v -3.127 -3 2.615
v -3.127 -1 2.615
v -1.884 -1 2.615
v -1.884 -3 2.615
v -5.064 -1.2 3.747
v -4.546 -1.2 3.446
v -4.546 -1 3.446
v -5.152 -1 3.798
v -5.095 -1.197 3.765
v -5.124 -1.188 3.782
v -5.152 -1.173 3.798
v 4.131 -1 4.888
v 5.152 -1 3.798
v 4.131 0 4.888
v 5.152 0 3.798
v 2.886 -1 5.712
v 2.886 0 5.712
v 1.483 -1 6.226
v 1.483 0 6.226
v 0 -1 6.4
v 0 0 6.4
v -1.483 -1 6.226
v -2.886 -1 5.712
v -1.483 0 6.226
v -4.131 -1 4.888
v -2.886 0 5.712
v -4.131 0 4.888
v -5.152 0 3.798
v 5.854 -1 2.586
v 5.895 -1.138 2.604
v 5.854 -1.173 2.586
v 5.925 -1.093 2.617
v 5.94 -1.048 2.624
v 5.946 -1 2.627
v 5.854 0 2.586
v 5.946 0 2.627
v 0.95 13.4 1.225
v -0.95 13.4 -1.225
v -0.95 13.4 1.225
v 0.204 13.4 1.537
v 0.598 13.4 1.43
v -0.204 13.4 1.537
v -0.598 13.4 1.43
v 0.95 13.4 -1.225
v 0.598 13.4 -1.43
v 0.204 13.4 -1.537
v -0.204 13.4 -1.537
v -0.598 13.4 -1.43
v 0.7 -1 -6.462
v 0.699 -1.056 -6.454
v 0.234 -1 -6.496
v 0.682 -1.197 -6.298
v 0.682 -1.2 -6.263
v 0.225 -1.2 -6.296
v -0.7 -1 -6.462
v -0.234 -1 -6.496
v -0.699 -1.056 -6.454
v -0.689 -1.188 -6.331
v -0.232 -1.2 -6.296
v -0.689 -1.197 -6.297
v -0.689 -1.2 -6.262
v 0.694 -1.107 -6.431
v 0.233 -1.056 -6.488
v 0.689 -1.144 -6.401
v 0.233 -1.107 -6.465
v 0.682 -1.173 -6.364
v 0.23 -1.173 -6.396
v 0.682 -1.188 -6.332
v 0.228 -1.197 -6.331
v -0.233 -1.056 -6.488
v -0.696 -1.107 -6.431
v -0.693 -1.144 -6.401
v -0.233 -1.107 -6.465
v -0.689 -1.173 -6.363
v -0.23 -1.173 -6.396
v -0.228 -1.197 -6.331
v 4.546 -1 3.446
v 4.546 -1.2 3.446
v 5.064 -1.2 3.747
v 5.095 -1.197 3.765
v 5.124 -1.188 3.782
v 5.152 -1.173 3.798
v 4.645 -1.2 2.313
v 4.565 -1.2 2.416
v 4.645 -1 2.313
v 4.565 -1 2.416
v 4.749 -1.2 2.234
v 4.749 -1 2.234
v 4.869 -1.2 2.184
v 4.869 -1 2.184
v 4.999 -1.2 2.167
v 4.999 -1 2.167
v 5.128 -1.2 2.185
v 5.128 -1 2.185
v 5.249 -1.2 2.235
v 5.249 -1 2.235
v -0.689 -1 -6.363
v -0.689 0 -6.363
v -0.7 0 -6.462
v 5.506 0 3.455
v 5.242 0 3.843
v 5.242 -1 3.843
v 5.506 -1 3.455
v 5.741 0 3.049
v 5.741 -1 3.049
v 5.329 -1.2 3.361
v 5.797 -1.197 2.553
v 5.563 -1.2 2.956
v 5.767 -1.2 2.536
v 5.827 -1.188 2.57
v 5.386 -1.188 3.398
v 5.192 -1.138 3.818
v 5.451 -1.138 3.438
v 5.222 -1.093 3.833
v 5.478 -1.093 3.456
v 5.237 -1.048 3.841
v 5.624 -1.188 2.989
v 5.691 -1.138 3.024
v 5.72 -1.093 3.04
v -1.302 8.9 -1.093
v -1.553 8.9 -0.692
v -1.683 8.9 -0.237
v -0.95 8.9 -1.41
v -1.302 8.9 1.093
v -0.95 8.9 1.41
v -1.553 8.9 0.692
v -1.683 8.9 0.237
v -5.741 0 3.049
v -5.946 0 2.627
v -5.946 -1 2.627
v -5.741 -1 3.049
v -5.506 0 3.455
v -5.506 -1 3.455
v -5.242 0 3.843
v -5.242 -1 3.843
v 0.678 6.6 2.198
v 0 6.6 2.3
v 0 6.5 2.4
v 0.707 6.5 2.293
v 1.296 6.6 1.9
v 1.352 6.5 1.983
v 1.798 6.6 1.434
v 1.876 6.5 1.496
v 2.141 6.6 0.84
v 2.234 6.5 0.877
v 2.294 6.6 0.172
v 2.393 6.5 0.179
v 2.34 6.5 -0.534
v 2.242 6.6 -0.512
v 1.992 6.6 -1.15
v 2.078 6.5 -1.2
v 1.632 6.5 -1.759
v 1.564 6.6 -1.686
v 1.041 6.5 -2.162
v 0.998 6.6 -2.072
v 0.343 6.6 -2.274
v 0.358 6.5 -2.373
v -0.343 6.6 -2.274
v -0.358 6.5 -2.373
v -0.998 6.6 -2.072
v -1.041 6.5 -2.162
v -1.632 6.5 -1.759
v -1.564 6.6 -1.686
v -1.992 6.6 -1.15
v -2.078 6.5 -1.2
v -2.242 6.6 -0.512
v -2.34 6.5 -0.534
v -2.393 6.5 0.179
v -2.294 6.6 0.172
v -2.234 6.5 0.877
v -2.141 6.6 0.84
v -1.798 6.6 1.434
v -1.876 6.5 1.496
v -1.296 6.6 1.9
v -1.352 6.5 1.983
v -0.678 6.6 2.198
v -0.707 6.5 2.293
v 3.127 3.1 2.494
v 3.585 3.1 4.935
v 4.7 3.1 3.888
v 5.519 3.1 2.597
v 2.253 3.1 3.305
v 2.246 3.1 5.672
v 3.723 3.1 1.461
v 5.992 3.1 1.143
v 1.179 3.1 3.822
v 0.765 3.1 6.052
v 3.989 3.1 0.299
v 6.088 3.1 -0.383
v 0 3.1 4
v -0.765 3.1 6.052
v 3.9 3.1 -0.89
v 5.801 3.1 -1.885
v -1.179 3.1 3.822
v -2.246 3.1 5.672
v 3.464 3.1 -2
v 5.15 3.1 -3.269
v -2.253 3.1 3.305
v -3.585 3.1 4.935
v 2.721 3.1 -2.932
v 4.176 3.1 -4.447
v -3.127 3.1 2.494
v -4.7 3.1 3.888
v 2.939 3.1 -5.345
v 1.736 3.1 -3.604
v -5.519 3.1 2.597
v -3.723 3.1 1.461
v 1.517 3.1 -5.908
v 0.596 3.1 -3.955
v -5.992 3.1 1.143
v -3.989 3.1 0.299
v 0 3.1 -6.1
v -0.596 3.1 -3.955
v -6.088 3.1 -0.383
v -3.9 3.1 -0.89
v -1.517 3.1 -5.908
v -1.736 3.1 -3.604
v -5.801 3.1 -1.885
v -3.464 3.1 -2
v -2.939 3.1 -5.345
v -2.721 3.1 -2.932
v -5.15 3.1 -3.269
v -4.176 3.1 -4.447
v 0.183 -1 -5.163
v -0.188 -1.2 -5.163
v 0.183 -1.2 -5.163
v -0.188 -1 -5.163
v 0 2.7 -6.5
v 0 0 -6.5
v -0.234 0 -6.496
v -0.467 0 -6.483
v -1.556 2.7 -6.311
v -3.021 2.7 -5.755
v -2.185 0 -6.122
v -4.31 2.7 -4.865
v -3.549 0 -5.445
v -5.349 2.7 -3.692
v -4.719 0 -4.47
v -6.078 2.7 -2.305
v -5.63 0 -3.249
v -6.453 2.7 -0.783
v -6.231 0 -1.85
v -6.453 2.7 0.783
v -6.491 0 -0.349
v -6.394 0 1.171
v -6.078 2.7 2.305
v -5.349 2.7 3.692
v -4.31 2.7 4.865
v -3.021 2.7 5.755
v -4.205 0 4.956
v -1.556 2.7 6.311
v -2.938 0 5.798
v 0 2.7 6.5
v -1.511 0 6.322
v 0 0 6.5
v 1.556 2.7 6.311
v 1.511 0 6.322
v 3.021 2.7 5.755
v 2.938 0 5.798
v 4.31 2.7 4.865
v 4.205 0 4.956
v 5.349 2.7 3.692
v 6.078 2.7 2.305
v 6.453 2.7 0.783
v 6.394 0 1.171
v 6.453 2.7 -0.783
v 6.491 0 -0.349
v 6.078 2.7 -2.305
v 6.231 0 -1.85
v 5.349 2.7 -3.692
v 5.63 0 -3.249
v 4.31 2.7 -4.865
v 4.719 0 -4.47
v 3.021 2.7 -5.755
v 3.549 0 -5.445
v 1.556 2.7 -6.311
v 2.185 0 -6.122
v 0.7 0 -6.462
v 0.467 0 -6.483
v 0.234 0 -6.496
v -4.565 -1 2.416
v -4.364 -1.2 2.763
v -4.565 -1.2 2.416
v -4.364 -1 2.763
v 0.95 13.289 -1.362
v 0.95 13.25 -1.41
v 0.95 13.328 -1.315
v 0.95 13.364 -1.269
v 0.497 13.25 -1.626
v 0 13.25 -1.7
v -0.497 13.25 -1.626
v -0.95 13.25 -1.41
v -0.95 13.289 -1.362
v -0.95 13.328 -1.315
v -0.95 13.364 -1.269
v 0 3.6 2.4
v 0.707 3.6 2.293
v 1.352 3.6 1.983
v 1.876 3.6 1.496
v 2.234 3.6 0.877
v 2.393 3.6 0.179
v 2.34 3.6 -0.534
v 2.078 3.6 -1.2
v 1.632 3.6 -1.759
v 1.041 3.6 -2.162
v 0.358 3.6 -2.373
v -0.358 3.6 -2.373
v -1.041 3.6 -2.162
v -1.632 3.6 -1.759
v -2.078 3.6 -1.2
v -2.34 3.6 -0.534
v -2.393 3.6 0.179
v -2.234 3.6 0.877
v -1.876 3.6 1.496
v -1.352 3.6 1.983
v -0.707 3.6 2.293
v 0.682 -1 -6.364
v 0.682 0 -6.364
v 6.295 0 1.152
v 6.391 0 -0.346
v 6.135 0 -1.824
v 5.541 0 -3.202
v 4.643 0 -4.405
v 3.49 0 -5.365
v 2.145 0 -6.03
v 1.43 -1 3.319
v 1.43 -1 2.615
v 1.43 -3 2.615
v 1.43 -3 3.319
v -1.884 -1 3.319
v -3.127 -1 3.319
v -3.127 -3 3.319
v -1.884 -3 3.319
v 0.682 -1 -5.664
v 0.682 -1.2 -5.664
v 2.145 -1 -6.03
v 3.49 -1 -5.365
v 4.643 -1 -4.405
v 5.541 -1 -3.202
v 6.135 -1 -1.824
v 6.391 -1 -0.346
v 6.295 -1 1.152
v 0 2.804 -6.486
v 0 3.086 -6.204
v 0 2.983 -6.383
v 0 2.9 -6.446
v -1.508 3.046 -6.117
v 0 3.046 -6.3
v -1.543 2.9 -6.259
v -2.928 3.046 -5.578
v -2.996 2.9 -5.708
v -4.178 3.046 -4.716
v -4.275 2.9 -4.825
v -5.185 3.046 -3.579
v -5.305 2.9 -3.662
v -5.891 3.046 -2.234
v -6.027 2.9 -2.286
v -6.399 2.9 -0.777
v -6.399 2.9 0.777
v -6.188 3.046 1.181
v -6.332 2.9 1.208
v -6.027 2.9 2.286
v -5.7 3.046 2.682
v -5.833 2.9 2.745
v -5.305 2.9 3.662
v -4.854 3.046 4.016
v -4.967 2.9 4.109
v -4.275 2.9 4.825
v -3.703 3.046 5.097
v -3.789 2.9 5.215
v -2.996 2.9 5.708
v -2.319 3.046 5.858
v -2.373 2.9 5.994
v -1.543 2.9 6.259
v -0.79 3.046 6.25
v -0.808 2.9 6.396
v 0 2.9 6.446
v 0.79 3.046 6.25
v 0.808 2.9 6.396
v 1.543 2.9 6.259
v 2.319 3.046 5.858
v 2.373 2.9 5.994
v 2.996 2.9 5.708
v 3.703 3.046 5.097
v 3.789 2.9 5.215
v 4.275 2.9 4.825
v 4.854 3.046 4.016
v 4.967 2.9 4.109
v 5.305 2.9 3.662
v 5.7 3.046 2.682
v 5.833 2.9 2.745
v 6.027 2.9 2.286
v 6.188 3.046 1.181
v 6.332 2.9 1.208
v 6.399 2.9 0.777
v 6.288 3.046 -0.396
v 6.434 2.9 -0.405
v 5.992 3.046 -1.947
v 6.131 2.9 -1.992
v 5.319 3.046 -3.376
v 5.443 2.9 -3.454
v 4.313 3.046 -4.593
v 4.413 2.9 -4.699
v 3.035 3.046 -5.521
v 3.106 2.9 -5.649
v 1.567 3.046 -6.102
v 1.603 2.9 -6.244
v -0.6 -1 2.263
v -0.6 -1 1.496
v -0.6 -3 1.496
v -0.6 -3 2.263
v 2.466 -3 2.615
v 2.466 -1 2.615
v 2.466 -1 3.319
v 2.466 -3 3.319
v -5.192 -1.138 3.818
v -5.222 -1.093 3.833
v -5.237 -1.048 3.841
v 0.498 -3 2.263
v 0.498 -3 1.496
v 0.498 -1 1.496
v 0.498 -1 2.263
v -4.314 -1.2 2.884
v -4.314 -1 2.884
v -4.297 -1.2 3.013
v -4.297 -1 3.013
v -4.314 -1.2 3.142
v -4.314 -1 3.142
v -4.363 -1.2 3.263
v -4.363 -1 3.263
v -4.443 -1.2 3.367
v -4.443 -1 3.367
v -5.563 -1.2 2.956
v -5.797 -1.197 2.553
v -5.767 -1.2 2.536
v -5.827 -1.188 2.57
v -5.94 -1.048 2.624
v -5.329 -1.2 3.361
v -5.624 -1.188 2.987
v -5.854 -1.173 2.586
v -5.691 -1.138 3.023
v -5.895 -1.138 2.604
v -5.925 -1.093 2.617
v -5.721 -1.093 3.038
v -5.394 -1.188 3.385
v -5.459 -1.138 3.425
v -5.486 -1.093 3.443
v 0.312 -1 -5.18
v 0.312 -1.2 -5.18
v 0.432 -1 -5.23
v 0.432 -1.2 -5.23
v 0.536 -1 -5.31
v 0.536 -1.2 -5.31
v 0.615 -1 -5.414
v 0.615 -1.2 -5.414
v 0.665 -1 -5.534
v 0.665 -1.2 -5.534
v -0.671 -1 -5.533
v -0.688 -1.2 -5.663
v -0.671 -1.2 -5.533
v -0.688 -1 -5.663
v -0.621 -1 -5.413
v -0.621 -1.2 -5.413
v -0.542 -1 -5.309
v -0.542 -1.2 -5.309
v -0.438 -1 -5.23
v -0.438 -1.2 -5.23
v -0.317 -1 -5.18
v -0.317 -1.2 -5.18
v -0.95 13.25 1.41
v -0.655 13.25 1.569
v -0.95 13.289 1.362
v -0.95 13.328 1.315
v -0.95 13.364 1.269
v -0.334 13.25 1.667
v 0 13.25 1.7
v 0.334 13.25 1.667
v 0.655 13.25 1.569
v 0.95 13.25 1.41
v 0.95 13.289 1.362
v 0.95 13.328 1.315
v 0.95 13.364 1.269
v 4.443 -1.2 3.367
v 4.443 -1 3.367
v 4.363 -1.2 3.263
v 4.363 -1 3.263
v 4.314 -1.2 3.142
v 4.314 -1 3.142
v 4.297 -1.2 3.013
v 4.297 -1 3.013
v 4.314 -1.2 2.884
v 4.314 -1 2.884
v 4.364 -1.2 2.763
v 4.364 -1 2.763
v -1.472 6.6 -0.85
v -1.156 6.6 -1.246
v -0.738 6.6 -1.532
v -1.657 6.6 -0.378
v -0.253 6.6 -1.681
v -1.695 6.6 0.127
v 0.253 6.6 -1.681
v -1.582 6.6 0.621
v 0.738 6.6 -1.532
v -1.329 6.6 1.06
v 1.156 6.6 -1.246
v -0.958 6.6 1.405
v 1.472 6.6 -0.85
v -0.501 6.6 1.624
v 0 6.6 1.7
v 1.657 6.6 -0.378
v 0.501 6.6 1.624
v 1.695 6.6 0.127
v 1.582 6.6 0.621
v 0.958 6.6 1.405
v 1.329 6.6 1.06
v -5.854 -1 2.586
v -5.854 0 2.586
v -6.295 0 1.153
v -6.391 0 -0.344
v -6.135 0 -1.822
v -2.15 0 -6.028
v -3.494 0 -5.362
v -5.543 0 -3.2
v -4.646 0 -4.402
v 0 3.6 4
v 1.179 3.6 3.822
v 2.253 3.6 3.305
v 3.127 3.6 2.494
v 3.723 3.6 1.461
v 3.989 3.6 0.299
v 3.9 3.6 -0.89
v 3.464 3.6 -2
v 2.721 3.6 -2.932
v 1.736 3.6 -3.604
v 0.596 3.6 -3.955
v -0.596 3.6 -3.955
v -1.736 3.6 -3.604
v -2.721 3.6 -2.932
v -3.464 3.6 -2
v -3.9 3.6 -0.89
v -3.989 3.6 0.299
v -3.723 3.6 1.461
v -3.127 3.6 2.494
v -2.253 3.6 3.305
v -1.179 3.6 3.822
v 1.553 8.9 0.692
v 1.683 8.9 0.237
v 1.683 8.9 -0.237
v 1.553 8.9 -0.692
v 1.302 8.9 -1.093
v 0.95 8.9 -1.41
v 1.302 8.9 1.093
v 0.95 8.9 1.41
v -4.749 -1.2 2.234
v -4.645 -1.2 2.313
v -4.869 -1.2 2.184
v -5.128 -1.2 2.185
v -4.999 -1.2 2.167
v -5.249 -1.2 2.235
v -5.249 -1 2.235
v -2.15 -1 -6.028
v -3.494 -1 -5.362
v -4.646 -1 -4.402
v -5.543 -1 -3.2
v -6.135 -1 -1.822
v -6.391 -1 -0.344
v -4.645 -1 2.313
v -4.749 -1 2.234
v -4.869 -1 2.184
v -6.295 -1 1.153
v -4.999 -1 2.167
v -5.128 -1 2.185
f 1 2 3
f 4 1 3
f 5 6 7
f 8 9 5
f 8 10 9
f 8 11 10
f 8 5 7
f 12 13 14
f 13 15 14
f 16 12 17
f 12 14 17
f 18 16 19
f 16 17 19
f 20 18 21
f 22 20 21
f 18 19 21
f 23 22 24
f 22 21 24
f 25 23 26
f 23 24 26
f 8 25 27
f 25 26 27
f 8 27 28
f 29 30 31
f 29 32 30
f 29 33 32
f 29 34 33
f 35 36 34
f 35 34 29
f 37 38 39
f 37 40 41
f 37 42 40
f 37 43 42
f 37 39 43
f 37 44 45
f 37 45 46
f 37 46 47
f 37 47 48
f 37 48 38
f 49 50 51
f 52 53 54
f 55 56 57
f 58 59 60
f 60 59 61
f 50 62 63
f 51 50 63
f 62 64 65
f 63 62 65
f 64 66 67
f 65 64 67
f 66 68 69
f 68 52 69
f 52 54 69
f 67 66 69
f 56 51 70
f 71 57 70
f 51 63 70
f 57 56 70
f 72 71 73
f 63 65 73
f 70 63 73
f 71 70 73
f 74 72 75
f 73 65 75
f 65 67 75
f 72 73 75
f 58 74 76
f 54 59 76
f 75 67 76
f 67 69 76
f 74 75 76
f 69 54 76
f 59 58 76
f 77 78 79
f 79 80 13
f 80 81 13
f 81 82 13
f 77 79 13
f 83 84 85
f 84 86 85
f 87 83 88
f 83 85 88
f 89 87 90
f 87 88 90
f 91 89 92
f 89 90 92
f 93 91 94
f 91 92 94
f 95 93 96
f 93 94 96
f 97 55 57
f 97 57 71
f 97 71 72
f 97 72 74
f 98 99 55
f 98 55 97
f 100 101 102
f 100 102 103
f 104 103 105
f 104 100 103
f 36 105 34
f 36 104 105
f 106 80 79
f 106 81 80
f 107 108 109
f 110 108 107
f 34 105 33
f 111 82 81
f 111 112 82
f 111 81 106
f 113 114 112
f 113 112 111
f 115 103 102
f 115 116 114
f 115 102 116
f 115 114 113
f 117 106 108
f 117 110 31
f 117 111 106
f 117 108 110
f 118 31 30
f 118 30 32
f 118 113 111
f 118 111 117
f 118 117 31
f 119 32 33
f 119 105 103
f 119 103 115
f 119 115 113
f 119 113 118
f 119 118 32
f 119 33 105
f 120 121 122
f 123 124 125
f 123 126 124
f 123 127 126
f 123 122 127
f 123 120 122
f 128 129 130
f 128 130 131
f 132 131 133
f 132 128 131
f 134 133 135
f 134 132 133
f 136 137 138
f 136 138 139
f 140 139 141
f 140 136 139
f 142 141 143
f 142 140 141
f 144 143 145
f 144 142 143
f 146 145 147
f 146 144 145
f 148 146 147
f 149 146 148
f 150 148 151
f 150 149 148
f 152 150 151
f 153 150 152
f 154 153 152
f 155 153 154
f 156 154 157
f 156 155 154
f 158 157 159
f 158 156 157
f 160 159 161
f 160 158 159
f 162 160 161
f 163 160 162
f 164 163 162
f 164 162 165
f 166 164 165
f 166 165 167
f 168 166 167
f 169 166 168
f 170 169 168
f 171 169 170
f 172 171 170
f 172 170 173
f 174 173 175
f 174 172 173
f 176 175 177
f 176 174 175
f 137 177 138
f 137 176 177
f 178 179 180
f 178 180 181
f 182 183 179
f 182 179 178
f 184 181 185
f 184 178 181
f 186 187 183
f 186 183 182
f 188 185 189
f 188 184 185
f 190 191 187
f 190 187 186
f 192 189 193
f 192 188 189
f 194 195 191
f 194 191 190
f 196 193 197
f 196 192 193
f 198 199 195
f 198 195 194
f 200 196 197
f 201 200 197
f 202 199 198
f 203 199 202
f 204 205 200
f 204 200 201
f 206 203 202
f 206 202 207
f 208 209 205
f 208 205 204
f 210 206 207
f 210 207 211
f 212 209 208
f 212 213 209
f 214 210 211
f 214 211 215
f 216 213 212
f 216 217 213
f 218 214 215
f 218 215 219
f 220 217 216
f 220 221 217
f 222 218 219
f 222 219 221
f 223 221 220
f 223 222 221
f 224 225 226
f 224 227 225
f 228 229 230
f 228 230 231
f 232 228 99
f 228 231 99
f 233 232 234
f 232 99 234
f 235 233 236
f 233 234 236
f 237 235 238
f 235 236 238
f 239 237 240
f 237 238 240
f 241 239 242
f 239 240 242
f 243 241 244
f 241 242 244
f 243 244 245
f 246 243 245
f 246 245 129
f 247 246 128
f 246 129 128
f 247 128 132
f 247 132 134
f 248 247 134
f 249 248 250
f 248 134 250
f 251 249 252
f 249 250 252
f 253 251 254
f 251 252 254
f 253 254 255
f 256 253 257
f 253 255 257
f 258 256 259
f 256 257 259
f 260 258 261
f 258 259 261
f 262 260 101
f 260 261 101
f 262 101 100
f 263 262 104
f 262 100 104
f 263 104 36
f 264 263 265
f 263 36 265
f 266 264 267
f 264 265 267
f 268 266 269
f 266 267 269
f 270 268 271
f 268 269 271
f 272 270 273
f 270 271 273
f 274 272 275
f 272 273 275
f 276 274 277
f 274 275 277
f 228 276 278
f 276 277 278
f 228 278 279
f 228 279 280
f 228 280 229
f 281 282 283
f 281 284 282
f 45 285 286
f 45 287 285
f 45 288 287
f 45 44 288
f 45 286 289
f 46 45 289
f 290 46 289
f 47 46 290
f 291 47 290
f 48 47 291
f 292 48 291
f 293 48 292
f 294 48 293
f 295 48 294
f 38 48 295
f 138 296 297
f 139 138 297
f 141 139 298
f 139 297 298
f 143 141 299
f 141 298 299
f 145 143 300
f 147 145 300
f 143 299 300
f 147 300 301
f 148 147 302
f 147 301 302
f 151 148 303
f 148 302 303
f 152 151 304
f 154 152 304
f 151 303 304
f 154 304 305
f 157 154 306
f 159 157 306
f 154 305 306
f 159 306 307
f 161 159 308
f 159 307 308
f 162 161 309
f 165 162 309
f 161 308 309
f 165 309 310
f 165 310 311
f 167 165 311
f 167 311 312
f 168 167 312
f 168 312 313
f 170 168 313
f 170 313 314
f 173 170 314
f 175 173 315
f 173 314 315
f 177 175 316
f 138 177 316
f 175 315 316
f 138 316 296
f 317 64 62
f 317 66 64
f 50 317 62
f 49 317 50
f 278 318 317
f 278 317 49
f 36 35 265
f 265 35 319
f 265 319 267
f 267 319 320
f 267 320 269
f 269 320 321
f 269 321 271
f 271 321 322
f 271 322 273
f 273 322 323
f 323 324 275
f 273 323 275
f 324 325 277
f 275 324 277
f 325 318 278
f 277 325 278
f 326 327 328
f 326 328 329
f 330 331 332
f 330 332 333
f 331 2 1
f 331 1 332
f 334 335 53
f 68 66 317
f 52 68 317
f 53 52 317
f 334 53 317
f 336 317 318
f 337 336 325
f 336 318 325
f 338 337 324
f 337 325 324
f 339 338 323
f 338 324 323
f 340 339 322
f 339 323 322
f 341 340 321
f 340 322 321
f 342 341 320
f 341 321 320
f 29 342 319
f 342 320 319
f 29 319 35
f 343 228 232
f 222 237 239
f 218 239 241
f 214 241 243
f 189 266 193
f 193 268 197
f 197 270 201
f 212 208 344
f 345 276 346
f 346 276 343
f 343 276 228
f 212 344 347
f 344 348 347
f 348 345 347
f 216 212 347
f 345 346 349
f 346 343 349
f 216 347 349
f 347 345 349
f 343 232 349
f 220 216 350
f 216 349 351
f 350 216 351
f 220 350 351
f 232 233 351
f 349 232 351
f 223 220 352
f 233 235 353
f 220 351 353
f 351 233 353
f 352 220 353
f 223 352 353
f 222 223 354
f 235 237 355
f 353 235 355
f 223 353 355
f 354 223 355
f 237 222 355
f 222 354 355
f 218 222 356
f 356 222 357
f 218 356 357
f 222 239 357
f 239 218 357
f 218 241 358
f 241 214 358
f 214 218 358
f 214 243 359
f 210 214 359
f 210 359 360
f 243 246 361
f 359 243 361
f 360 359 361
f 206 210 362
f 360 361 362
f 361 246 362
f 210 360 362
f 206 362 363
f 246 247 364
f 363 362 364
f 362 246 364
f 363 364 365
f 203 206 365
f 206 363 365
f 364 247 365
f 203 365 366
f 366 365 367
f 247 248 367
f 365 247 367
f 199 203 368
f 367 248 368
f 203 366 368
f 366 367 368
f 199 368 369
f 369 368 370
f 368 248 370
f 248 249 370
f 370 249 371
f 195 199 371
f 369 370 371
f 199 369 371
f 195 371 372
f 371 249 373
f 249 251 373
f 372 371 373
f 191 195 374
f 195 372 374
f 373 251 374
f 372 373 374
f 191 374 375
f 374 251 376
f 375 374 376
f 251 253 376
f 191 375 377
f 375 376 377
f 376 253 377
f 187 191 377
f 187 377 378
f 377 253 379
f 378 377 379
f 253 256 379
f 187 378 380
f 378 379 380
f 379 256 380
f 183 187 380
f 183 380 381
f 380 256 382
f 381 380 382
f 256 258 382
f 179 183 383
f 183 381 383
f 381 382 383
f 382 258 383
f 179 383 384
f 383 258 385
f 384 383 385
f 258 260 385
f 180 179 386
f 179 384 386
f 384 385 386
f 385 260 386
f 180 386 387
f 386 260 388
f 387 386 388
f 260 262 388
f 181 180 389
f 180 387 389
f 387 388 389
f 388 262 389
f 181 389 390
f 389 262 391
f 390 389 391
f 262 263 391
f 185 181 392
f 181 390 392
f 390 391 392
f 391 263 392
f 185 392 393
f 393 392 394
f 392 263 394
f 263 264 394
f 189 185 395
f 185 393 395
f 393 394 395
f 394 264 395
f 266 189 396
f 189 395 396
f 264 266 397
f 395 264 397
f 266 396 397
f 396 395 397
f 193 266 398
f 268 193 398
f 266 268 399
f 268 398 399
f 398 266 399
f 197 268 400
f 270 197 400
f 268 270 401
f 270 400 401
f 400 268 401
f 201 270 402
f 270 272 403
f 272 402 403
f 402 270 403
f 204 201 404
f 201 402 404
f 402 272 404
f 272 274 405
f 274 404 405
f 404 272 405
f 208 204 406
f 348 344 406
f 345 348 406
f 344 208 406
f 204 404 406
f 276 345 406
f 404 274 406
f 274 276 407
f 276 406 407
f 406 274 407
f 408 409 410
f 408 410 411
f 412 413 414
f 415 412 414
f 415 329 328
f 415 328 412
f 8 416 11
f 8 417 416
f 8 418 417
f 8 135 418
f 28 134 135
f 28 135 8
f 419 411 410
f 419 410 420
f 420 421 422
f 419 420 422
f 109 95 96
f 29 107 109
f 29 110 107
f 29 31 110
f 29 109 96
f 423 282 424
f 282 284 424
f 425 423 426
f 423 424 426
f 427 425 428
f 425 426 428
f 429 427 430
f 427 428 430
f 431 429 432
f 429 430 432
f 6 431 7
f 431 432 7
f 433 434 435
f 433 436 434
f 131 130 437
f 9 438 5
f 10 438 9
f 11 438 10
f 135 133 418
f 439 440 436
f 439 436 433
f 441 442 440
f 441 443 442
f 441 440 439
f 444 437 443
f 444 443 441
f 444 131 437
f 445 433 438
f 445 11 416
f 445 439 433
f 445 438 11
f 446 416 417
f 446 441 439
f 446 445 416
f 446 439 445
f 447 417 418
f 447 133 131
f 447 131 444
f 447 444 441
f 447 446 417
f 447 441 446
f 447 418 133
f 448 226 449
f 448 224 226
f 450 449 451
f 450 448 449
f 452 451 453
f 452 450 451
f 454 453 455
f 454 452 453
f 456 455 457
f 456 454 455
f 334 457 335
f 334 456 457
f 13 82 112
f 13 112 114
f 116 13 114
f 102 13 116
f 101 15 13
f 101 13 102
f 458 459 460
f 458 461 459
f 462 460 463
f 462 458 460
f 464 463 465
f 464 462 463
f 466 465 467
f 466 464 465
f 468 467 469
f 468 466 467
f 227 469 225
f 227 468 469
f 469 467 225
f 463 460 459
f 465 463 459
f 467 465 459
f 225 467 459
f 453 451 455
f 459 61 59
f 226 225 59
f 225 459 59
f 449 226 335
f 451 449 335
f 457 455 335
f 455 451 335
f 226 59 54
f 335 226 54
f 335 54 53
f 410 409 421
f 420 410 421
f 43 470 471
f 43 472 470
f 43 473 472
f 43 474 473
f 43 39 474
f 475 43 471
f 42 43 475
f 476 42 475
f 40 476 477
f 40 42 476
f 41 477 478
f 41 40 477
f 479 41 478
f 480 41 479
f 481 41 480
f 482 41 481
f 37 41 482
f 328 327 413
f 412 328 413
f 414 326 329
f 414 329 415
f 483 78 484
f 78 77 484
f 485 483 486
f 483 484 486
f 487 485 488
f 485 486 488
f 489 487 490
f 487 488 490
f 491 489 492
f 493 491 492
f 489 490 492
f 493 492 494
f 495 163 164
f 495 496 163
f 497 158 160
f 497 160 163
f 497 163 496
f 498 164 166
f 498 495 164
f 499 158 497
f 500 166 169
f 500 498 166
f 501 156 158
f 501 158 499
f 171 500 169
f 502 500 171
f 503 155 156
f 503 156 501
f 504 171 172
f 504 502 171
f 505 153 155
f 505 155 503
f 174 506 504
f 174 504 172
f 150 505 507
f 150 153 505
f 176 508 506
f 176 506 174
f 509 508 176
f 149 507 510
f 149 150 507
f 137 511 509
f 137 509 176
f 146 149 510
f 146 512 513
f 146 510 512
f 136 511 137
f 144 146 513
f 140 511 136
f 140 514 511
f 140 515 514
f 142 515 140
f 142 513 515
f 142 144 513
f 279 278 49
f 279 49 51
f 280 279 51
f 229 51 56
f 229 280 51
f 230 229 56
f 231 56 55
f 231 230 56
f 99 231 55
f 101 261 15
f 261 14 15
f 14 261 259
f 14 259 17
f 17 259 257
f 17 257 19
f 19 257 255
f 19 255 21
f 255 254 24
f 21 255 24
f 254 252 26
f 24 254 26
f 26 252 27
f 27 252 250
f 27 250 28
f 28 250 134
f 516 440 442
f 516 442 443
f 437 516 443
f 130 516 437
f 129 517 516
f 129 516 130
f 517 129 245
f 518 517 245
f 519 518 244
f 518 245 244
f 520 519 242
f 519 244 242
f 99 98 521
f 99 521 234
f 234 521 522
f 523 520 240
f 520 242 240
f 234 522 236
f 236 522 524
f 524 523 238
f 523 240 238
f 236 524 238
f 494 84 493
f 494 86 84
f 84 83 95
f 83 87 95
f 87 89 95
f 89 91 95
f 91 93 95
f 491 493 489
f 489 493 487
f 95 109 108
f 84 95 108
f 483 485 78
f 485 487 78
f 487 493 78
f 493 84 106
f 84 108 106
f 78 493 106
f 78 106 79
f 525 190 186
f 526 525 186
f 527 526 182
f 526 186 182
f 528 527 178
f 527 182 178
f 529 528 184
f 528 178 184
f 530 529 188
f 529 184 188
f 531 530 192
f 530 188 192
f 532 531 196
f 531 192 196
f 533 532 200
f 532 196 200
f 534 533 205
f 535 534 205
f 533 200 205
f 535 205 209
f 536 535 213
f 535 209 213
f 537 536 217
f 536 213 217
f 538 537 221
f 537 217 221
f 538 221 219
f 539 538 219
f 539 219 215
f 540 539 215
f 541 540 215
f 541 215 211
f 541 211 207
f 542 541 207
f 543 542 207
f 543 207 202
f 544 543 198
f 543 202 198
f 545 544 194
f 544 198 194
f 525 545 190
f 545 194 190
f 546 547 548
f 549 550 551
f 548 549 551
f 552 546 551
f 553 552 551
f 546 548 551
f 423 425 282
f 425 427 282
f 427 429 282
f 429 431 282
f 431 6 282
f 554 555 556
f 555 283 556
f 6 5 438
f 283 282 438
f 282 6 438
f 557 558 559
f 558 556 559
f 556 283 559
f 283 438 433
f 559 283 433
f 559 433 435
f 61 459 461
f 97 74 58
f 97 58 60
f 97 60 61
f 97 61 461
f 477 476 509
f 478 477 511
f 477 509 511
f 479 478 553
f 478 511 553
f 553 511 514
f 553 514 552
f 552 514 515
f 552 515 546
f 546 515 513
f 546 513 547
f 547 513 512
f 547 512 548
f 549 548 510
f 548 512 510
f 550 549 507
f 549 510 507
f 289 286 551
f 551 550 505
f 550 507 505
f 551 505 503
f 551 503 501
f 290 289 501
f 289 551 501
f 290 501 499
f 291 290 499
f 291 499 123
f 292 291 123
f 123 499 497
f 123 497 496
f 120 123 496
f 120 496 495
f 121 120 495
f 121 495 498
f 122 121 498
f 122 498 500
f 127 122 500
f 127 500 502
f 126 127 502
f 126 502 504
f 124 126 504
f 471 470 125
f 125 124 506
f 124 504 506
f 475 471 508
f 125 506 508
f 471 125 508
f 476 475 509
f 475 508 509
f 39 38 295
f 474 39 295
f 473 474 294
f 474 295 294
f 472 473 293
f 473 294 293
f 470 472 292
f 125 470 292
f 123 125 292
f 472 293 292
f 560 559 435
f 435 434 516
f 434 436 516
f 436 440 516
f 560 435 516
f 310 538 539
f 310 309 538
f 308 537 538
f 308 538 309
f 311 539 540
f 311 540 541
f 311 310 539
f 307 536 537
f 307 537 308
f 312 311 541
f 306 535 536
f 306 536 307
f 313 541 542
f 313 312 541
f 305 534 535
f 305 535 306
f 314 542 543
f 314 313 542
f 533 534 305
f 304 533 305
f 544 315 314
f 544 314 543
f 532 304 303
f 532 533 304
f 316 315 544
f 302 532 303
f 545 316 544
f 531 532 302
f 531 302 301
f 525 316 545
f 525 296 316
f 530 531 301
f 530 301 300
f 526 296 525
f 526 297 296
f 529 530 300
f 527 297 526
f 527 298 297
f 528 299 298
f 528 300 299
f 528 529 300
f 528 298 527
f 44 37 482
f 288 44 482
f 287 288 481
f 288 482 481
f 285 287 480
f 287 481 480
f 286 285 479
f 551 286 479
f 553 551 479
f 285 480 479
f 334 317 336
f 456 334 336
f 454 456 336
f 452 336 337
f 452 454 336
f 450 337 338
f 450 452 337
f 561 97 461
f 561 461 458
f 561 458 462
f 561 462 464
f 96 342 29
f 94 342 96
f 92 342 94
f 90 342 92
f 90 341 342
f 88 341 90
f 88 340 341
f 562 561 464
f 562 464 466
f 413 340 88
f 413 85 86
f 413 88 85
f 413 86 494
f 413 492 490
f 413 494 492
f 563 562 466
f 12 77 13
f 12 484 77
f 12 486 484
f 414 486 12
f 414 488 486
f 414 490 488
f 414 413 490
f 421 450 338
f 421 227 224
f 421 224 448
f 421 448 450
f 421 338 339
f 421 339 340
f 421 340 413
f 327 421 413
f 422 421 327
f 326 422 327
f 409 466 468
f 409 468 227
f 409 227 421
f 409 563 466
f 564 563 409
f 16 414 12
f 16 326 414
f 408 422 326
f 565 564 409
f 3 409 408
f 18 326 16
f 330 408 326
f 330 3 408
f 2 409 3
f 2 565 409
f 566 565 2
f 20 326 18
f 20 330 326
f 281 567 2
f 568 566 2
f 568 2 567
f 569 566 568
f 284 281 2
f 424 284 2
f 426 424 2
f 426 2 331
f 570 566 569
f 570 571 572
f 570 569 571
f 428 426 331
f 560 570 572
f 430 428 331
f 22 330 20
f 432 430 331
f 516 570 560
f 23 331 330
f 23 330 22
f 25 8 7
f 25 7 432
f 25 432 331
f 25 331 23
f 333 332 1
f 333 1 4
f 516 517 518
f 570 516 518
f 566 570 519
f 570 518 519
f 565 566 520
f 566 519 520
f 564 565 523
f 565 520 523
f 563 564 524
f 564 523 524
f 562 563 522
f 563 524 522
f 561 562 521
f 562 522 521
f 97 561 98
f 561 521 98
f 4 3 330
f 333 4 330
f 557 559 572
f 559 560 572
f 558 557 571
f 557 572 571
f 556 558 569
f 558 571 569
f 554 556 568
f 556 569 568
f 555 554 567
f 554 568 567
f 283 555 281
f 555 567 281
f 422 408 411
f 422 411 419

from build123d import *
from build123d.topology import SkipClean

# Parameters (mm, degrees)
SKETCH1_R            = 6.5
BOSS_EXTRUDE1_DEPTH  = 3.1
SKETCH2_R            = 4
BOSS_EXTRUDE2_DEPTH  = 0.5
SKETCH3_R            = 2.4
BOSS_EXTRUDE3_DEPTH  = 3
SKETCH4_R            = 1.7
BOSS_EXTRUDE4_DEPTH  = 6.8
CHAMFER1_SIZE        = 0.15
CUT_EXTRUDE1_DEPTH   = 4.5
SKETCH6_R            = 6.4
BOSS_EXTRUDE5_DEPTH  = 1
FILLET1_R            = 0.4
CHAMFER2_SIZE        = 0.1
BOSS_EXTRUDE6_DEPTH  = 1.2
SKETCH8_W            = 1.400599112
SKETCH8_H            = 0.2
BOSS_EXTRUDE7_DEPTH  = 1.2
SKETCH9_W            = 1.400599112
SKETCH9_H            = 0.2
BOSS_EXTRUDE8_DEPTH  = 1.2
SKETCH10_W           = 1.370501576
SKETCH10_H           = 0.2
BOSS_EXTRUDE9_DEPTH  = 1.2
FILLET2_R            = 0.5
FILLET3_R            = 0.2
SKETCH11_W           = 1.09784978
SKETCH11_H           = 0.766423431
SKETCH11_W_2         = 1.035707339
SKETCH11_H_2         = 0.70428099
SKETCH11_W_3         = 1.242848807
BOSS_EXTRUDE10_DEPTH = 2


with BuildPart() as part:
    # Sketch1 → Boss-Extrude1 (new body)
    with BuildSketch(Plane(origin=(0, 0, 0), x_dir=(1, 0, 0), z_dir=(0, 1, 0))):
        with Locations(Location((0, 0, 0), (0, 0, 90))):
            Circle(SKETCH1_R)
    extrude(amount=BOSS_EXTRUDE1_DEPTH)

    # Sketch2 → Boss-Extrude2 (add)
    with BuildSketch(Plane(origin=(0, 3.1, 0), x_dir=(1, 0, 0), z_dir=(0, 1, 0))):
        with Locations(Location((0, 0, 0), (0, 0, 270))):
            Circle(SKETCH2_R)
    extrude(amount=BOSS_EXTRUDE2_DEPTH)

    # Sketch3 → Boss-Extrude3 (add)
    with BuildSketch(Plane(origin=(0, 3.6, 0), x_dir=(-1, 0, 0), z_dir=(0, 1, 0))):
        with Locations(Location((0, 0, 0), (0, 0, 90))):
            Circle(SKETCH3_R)
    extrude(amount=BOSS_EXTRUDE3_DEPTH)

    # Sketch4 → Boss-Extrude4 (add)
    with BuildSketch(Plane(origin=(0, 6.6, 0), x_dir=(1, 0, 0), z_dir=(0, 1, 0))):
        with Locations(Location((0, 0, 0), (0, 0, 270))):
            Circle(SKETCH4_R)
    extrude(amount=BOSS_EXTRUDE4_DEPTH)

    # Chamfer1
    chamfer1_edges = [part.edges().sort_by_distance(p)[0] for p in [
        (0, 13.4, -1.7),
    ]]
    chamfer(chamfer1_edges, length=CHAMFER1_SIZE)

    # Sketch5 → Cut-Extrude1 (cut)
    with BuildSketch(Plane(origin=(0, 13.4, 0), x_dir=(1, 0, 0), z_dir=(0, 1, 0))):
        Polygon((0.95, 0), (0.95, 1.953547683), (2.291589772, 1.953547683), (2.291589772, -1.88704126), (0.95, -1.88704126), align=None)
        Polygon((-0.95, 0), (-0.95, 2.055691006), (-2.284431096, 2.055691006), (-2.21293077, -1.815540934), (-0.95, -1.815540934), align=None)
    extrude(amount=-CUT_EXTRUDE1_DEPTH, mode=Mode.SUBTRACT)

    # Sketch6 → Boss-Extrude5 (add)
    with BuildSketch(Plane.XZ):
        with Locations(Location((0, 0, 0), (0, 0, 90))):
            Circle(SKETCH6_R)
    extrude(amount=BOSS_EXTRUDE5_DEPTH)

    # Fillet1
    fillet1_edges = [part.edges().sort_by_distance(p)[0] for p in [
        (0, 3.1, 6.5),
    ]]
    fillet(fillet1_edges, radius=FILLET1_R)

    # Chamfer2
    chamfer2_edges = [part.edges().sort_by_distance(p)[0] for p in [
        (0, 6.6, -2.4),
    ]]
    chamfer(chamfer2_edges, length=CHAMFER2_SIZE)

    # Sketch7 → Boss-Extrude6 (add)
    with SkipClean():  # the faces are left unmerged after this step: merging them gives an invalid solid
        with BuildSketch(Plane.XZ):
            with BuildLine():
                Line((5.151524141, 3.79760438), (5.242126256, 3.843190382))
                ThreePointArc((5.242126256, 3.843190382), (5.626855667, 3.253996819), (5.945638893, 2.626666738))
                Line((5.945638893, 2.626666738), (5.854255539, 2.586057247))
                Line((5.854255539, 2.586057247), (5.151524141, 3.79760438))
            make_face()
            with BuildLine():
                Line((-5.242126256, 3.843190382), (-5.151524141, 3.79760438))
                Line((-5.151524141, 3.79760438), (-5.854255539, 2.586057247))
                Line((-5.854255539, 2.586057247), (-5.945638893, 2.626666738))
                ThreePointArc((-5.945638893, 2.626666738), (-5.626855667, 3.253996819), (-5.242126256, 3.843190382))
            make_face()
            with BuildLine():
                Line((-0.7, -6.462197769), (-0.688624102, -6.362845028))
                Line((-0.688624102, -6.362845028), (0.681877282, -6.363571589))
                Line((0.681877282, -6.363571589), (0.7, -6.462197769))
                ThreePointArc((0.7, -6.462197769), (0, -6.5), (-0.7, -6.462197769))
            make_face()
        extrude(amount=BOSS_EXTRUDE6_DEPTH)

    # Sketch8 → Boss-Extrude7 (add)
    with SkipClean():  # the faces are left unmerged after this step: merging them gives an invalid solid
        with BuildSketch(Plane(origin=(5.50288984, 0, 3.191830814), x_dir=(-0.5017362869920535, 0, 0.8650206346182893), z_dir=(-0.8650206346182893, 0, -0.5017362869920535))):
            with Locations((0, -1.1)):
                Rectangle(SKETCH8_W, SKETCH8_H)
        extrude(amount=BOSS_EXTRUDE7_DEPTH)

    # Sketch9 → Boss-Extrude8 (add)
    with SkipClean():  # the faces are left unmerged after this step: merging them gives an invalid solid
        with BuildSketch(Plane(origin=(-5.50288984, 0, 3.191830814), x_dir=(-0.5017362869920535, 0, -0.8650206346182893), z_dir=(0.8650206346182893, 0, -0.5017362869920535))):
            with Locations((0, -1.1)):
                Rectangle(SKETCH9_W, SKETCH9_H)
        extrude(amount=BOSS_EXTRUDE8_DEPTH)

    # Sketch10 → Boss-Extrude9 (add)
    with SkipClean():  # the faces are left unmerged after this step: merging them gives an invalid solid
        with BuildSketch(Plane(origin=(-0.00337341, 0, -6.363208308), x_dir=(0.9999998594742814, 0, -0.0005301428274771333), z_dir=(0.0005301428274771333, 0, 0.9999998594742814))):
            with Locations((0, -1.1)):
                Rectangle(SKETCH10_W, SKETCH10_H)
        extrude(amount=BOSS_EXTRUDE9_DEPTH)

    # Fillet2
    fillet2_edges = [part.edges().sort_by_distance(p)[0] for p in [
        (4.113499379, -1.1, 3.195520836),
        (4.816230777, -1.1, 1.983973703),
        (-4.113499379, -1.1, 3.195520836),
        (-4.816230777, -1.1, 1.983973703),
        (0.682513454, -1.1, -5.163571758),
        (-0.68798793, -1.1, -5.162845196),
    ]]
    fillet(fillet2_edges, radius=FILLET2_R)

    # Fillet3
    fillet3_edges = [part.edges().sort_by_distance(p)[0] for p in [
        (5.626855667, -1.2, 3.253996819),
        (0, -1.2, -6.5),
        (-5.626855667, -1.2, 3.253996819),
    ]]
    fillet(fillet3_edges, radius=FILLET3_R)

    # Sketch11 → Boss-Extrude10 (add)
    with BuildSketch(Plane.XZ.offset(1)):
        with Locations((-0.051193187, 1.87960604)):
            Rectangle(SKETCH11_W, SKETCH11_H)
        with Locations((1.947721978, 2.967098746)):
            Rectangle(SKETCH11_W_2, SKETCH11_H_2)
        with Locations((-2.505819581, 2.967098746)):
            Rectangle(SKETCH11_W_3, SKETCH11_H_2)
    extrude(amount=BOSS_EXTRUDE10_DEPTH)


solid = part.part
